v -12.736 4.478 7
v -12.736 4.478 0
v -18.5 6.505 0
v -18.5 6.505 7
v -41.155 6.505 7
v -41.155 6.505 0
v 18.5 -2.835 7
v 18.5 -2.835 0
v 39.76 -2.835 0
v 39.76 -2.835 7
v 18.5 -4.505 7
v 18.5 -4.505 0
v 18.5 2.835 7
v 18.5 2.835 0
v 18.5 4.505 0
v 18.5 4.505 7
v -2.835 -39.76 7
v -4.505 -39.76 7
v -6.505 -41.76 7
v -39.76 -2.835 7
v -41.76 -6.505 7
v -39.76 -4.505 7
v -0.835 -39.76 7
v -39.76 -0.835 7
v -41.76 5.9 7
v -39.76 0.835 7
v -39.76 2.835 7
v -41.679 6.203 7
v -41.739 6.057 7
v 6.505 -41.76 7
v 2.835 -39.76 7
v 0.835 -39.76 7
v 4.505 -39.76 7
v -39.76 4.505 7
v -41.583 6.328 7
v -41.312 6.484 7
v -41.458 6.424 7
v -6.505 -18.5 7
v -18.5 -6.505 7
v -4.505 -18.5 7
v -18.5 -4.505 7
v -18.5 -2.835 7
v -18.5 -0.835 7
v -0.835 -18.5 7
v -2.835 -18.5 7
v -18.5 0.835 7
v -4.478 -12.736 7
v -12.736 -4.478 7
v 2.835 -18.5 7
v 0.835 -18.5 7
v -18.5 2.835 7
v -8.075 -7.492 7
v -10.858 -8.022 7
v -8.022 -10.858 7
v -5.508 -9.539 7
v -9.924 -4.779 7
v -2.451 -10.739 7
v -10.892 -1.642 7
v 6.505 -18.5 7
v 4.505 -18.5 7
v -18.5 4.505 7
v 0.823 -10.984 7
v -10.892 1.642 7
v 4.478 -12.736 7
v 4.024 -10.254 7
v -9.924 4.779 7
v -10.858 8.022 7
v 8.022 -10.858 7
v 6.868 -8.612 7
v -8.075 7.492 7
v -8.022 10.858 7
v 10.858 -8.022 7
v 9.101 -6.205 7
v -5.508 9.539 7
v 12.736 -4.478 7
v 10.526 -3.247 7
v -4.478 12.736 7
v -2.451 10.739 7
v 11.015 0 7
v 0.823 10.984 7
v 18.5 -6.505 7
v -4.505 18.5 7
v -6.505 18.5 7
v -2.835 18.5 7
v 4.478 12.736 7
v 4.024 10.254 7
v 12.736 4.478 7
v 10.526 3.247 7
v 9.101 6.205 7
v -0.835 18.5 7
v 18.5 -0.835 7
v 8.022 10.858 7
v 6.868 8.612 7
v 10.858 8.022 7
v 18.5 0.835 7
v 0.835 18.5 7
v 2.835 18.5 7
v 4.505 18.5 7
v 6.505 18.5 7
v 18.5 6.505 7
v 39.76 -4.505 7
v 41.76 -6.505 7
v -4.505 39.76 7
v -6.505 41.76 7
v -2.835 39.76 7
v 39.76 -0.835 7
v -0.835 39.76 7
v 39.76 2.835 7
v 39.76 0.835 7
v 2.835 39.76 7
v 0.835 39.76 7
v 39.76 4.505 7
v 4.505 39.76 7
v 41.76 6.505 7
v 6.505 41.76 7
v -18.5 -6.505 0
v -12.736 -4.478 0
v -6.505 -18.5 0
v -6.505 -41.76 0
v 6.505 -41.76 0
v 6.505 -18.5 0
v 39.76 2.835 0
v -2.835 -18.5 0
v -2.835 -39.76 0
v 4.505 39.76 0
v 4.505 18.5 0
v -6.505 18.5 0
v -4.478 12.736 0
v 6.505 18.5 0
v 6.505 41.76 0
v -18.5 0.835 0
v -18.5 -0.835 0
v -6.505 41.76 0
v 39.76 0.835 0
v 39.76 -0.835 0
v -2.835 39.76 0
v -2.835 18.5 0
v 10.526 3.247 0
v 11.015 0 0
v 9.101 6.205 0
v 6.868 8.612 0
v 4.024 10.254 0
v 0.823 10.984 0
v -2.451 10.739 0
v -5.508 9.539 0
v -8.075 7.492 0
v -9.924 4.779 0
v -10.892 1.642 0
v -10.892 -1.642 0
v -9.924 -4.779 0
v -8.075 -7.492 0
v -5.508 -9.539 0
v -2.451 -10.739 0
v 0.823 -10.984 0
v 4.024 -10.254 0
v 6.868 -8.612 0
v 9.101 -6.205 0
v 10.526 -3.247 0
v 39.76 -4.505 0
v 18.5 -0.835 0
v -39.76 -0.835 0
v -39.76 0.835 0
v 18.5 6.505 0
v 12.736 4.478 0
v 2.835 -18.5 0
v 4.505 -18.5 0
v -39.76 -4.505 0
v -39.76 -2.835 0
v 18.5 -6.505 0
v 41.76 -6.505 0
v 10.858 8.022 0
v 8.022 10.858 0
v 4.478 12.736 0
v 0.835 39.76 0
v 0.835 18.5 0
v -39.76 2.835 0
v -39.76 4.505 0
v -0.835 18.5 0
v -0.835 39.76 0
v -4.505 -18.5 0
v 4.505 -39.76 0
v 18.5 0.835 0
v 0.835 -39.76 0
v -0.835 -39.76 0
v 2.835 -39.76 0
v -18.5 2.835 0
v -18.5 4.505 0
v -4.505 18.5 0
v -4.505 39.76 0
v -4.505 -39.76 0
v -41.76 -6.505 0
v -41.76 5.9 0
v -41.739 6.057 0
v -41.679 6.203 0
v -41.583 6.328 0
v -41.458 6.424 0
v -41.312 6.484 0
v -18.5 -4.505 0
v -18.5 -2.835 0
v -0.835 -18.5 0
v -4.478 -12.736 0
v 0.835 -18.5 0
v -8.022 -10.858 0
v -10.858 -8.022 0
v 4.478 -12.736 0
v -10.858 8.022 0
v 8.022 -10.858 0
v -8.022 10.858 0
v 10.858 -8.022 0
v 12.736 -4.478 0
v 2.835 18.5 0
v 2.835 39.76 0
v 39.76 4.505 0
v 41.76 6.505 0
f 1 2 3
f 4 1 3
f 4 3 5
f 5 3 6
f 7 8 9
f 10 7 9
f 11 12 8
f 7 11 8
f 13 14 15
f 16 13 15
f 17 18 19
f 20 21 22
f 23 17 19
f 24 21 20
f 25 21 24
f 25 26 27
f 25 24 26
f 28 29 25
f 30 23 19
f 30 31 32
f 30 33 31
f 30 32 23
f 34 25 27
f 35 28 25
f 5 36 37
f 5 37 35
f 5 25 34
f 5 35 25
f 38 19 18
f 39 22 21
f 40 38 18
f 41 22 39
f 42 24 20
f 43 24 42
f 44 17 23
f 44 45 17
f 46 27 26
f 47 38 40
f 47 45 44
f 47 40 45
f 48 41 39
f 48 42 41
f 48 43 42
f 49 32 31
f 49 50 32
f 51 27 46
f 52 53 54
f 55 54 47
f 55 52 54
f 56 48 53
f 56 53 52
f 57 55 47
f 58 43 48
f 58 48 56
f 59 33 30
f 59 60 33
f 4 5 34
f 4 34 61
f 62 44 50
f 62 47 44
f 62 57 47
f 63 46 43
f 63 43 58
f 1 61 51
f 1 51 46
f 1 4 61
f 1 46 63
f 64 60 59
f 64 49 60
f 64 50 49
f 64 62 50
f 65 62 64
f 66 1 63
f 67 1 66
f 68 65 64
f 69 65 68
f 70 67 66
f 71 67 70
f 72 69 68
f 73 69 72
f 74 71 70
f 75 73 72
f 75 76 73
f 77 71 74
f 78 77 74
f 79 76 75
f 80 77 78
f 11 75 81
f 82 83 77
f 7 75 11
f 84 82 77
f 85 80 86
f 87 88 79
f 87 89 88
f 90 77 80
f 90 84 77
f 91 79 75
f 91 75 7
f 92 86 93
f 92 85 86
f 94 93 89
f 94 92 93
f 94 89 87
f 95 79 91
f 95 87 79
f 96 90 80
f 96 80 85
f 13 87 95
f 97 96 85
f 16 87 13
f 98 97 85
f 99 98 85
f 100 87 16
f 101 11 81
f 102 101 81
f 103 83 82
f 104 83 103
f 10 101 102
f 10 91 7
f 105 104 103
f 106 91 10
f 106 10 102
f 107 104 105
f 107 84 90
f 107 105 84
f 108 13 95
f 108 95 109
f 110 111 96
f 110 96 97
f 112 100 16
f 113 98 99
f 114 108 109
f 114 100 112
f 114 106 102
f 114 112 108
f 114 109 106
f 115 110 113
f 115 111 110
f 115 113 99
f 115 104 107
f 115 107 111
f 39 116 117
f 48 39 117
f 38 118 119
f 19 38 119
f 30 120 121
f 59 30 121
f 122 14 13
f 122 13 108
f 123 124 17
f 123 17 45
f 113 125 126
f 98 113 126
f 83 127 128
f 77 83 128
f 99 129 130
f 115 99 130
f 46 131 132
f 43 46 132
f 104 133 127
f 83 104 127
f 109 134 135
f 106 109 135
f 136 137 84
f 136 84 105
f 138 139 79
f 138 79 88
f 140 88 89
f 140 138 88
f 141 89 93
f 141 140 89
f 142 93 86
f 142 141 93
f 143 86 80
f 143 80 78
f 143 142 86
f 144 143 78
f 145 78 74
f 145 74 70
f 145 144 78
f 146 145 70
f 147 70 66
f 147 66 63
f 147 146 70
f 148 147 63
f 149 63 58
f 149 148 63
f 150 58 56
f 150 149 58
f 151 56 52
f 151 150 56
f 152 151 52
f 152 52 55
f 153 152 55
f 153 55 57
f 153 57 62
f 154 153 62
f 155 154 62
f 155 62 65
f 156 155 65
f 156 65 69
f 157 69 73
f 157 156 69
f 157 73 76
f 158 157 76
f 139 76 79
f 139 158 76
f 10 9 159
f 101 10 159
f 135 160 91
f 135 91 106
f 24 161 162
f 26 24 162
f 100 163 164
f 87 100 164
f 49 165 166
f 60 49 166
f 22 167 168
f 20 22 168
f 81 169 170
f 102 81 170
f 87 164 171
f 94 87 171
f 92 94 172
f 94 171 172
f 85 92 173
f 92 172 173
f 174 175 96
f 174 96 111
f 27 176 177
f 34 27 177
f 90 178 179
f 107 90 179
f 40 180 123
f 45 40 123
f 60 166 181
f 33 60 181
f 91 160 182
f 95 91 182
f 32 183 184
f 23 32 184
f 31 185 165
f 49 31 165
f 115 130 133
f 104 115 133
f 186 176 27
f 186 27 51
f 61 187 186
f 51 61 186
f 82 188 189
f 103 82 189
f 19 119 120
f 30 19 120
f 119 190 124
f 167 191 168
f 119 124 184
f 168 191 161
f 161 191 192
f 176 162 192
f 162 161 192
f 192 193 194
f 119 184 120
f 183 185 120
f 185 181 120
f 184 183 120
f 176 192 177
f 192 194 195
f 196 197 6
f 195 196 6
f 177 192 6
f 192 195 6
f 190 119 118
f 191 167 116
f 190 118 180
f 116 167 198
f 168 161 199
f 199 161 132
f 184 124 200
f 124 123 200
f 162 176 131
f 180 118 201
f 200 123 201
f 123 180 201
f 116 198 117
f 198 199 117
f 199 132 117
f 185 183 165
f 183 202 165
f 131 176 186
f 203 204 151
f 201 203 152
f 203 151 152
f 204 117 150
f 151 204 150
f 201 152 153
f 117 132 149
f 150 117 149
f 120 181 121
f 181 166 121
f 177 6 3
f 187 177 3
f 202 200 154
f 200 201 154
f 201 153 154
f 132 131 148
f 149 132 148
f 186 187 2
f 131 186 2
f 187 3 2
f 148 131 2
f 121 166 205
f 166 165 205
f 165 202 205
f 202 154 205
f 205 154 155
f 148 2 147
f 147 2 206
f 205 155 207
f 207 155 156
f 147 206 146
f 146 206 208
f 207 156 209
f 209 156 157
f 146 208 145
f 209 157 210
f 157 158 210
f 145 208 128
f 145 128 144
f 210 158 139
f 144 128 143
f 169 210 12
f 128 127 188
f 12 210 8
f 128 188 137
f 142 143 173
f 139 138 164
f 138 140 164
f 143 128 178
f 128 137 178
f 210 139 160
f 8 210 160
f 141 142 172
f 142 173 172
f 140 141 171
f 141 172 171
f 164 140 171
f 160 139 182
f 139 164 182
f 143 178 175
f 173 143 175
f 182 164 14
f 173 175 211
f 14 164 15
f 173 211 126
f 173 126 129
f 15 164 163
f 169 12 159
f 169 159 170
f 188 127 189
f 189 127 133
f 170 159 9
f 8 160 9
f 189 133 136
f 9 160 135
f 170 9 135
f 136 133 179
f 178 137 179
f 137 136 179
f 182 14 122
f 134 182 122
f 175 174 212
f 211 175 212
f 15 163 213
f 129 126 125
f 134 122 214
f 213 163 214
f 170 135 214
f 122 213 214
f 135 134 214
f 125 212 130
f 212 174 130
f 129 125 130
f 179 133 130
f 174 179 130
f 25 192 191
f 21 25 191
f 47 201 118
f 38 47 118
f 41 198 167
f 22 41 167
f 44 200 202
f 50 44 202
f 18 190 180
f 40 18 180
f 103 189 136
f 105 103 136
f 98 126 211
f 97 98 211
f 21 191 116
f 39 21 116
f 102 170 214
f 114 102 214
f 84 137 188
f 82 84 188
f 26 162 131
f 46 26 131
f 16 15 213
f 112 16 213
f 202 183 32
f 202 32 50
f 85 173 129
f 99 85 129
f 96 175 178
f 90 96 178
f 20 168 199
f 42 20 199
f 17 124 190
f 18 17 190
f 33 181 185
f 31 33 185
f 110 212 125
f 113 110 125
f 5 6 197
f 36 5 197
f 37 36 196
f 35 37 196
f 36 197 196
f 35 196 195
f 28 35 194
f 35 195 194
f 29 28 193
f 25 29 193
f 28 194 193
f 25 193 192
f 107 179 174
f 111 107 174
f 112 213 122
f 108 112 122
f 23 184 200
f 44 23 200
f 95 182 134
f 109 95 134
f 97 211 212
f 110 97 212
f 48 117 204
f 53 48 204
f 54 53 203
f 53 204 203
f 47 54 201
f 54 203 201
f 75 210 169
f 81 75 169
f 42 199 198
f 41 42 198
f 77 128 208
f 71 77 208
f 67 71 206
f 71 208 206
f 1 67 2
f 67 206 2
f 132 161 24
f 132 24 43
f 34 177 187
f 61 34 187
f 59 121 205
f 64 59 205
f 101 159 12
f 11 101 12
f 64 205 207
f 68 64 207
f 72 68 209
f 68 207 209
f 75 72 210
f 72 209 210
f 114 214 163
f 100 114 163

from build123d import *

# Parameters (mm, degrees)
F0_R     = 11.015
F1_DEPTH = 7
F2_DEPTH = 7
F3_DEPTH = 7
F0_W     = 2
F0_H     = 21.26
F0_W_2   = 21.26
F0_H_2   = 2
F4_DEPTH = 7


with BuildPart() as f1:
    # F0 (on Top) → F1 (new body)
    with BuildSketch(Plane.XY):
        with BuildLine():
            ThreePointArc((12.735635, 4.478125), (13.307537, 2.271445), (13.5, 0))
            Line((13.5, 0), (18.5, 0))
            Line((18.5, 0), (18.5, 0.835))
            Line((18.5, 0.835), (18.5, 2.835))
            Line((18.5, 2.835), (18.5, 4.505))
            Line((18.5, 4.505), (39.76, 4.505))
            Line((39.76, 4.505), (39.76, 6.505))
            Line((39.76, 6.505), (18.5, 6.505))
            Line((18.5, 6.505), (12.735635, 4.478125))
        make_face()
        with BuildLine():
            ThreePointArc((0, 13.5), (2.271445, 13.307537), (4.478125, 12.735635))
            Line((4.478125, 12.735635), (6.505, 18.5))
            Line((6.505, 18.5), (6.505, 39.76))
            Line((6.505, 39.76), (4.505, 39.76))
            Line((4.505, 39.76), (4.505, 18.5))
            Line((4.505, 18.5), (2.835, 18.5))
            Line((2.835, 18.5), (0.835, 18.5))
            Line((0.835, 18.5), (0, 18.5))
            Line((0, 18.5), (0, 13.5))
        make_face()
        with BuildLine():
            ThreePointArc((-4.478125, 12.735635), (-2.271445, 13.307537), (0, 13.5))
            Line((0, 13.5), (0, 18.5))
            Line((0, 18.5), (-0.835, 18.5))
            Line((-0.835, 18.5), (-2.835, 18.5))
            Line((-2.835, 18.5), (-4.505, 18.5))
            Line((-4.505, 18.5), (-4.505, 39.76))
            Line((-4.505, 39.76), (-6.505, 39.76))
            Line((-6.505, 39.76), (-6.505, 18.5))
            Line((-6.505, 18.5), (-4.478125, 12.735635))
        make_face()
        with BuildLine():
            ThreePointArc((-13.5, 0), (-13.307537, 2.271445), (-12.735635, 4.478125))
            Line((-12.735635, 4.478125), (-18.5, 6.505))
            Line((-18.5, 6.505), (-39.76, 6.505))
            Line((-39.76, 6.505), (-39.76, 4.505))
            Line((-39.76, 4.505), (-18.5, 4.505))
            Line((-18.5, 4.505), (-18.5, 2.835))
            Line((-18.5, 2.835), (-18.5, 0.835))
            Line((-18.5, 0.835), (-18.5, 0))
            Line((-18.5, 0), (-13.5, 0))
        make_face()
        with BuildLine():
            Line((-18.5, -6.505), (-12.735635, -4.478125))
            ThreePointArc((-12.735635, -4.478125), (-13.307537, -2.271445), (-13.5, 0))
            Line((-13.5, 0), (-18.5, 0))
            Line((-18.5, 0), (-18.5, -0.835))
            Line((-18.5, -0.835), (-18.5, -2.835))
            Line((-18.5, -2.835), (-18.5, -4.505))
            Line((-18.5, -4.505), (-39.76, -4.505))
            Line((-39.76, -4.505), (-39.76, -6.505))
            Line((-39.76, -6.505), (-18.5, -6.505))
        make_face()
        with BuildLine():
            Line((0, -18.5), (0, -13.5))
            ThreePointArc((0, -13.5), (-2.271445, -13.307537), (-4.478125, -12.735635))
            Line((-4.478125, -12.735635), (-6.505, -18.5))
            Line((-6.505, -18.5), (-6.505, -39.76))
            Line((-6.505, -39.76), (-4.505, -39.76))
            Line((-4.505, -39.76), (-4.505, -18.5))
            Line((-4.505, -18.5), (-2.835, -18.5))
            Line((-2.835, -18.5), (-0.835, -18.5))
            Line((-0.835, -18.5), (0, -18.5))
        make_face()
        with BuildLine():
            Line((6.505, -18.5), (4.478125, -12.735635))
            ThreePointArc((4.478125, -12.735635), (2.271445, -13.307537), (0, -13.5))
            Line((0, -13.5), (0, -18.5))
            Line((0, -18.5), (0.835, -18.5))
            Line((0.835, -18.5), (2.835, -18.5))
            Line((2.835, -18.5), (4.505, -18.5))
            Line((4.505, -18.5), (4.505, -39.76))
            Line((4.505, -39.76), (6.505, -39.76))
            Line((6.505, -39.76), (6.505, -18.5))
        make_face()
        with BuildLine():
            Line((18.5, 0), (13.5, 0))
            ThreePointArc((13.5, 0), (13.307537, -2.271445), (12.735635, -4.478125))
            Line((12.735635, -4.478125), (18.5, -6.505))
            Line((18.5, -6.505), (39.76, -6.505))
            Line((39.76, -6.505), (39.76, -4.505))
            Line((39.76, -4.505), (18.5, -4.505))
            Line((18.5, -4.505), (18.5, -2.835))
            Line((18.5, -2.835), (18.5, -0.835))
            Line((18.5, -0.835), (18.5, 0))
        make_face()
        Polygon((4.505, 39.76), (6.505, 39.76), (6.505, 41.76), (-6.505, 41.76), (-6.505, 39.76), (-4.505, 39.76), (-2.835, 39.76), (-0.835, 39.76), (0, 39.76), (0.835, 39.76), (2.835, 39.76), align=None)
        with BuildLine():
            Line((-39.76, 4.505), (-39.76, 6.505))
            Line((-39.76, 6.505), (-41.155497, 6.505))
            ThreePointArc((-41.155497, 6.505), (-41.582945, 6.327945), (-41.76, 5.900497))
            Line((-41.76, 5.900497), (-41.76, -6.505))
            Line((-41.76, -6.505), (-39.76, -6.505))
            Line((-39.76, -6.505), (-39.76, -4.505))
            Line((-39.76, -4.505), (-39.76, -2.835))
            Line((-39.76, -2.835), (-39.76, -0.835))
            Line((-39.76, -0.835), (-39.76, 0))
            Line((-39.76, 0), (-39.76, 0.835))
            Line((-39.76, 0.835), (-39.76, 2.835))
            Line((-39.76, 2.835), (-39.76, 4.505))
        make_face()
        Polygon((6.505, -41.76), (6.505, -39.76), (4.505, -39.76), (2.835, -39.76), (0.835, -39.76), (0, -39.76), (-0.835, -39.76), (-2.835, -39.76), (-4.505, -39.76), (-6.505, -39.76), (-6.505, -41.76), align=None)
        Polygon((41.76, 6.505), (39.76, 6.505), (39.76, 4.505), (39.76, 2.835), (39.76, 0.835), (39.76, 0), (39.76, -0.835), (39.76, -2.835), (39.76, -4.505), (39.76, -6.505), (41.76, -6.505), align=None)
        with BuildLine():
            ThreePointArc((12.735635, -4.478125), (13.307537, -2.271445), (13.5, 0))
            ThreePointArc((13.5, 0), (13.307537, 2.271445), (12.735635, 4.478125))
            ThreePointArc((12.735635, 4.478125), (9.545942, 9.545942), (4.478125, 12.735635))
            ThreePointArc((4.478125, 12.735635), (2.271445, 13.307537), (0, 13.5))
            ThreePointArc((0, 13.5), (-2.271445, 13.307537), (-4.478125, 12.735635))
            ThreePointArc((-4.478125, 12.735635), (-9.545942, 9.545942), (-12.735635, 4.478125))
            ThreePointArc((-12.735635, 4.478125), (-13.307537, 2.271445), (-13.5, 0))
            ThreePointArc((-13.5, 0), (-13.307537, -2.271445), (-12.735635, -4.478125))
            ThreePointArc((-12.735635, -4.478125), (-9.545942, -9.545942), (-4.478125, -12.735635))
            ThreePointArc((-4.478125, -12.735635), (-2.271445, -13.307537), (0, -13.5))
            ThreePointArc((0, -13.5), (2.271445, -13.307537), (4.478125, -12.735635))
            ThreePointArc((4.478125, -12.735635), (9.545942, -9.545942), (12.735635, -4.478125))
        make_face()
        Circle(F0_R, mode=Mode.SUBTRACT)
    extrude(amount=F1_DEPTH)

    # F0 (on Top) → F2 (join)
    with BuildSketch(Plane.XY):
        with BuildLine():
            ThreePointArc((12.735635, 4.478125), (13.307537, 2.271445), (13.5, 0))
            Line((13.5, 0), (18.5, 0))
            Line((18.5, 0), (18.5, 0.835))
            Line((18.5, 0.835), (18.5, 2.835))
            Line((18.5, 2.835), (18.5, 4.505))
            Line((18.5, 4.505), (39.76, 4.505))
            Line((39.76, 4.505), (39.76, 6.505))
            Line((39.76, 6.505), (18.5, 6.505))
            Line((18.5, 6.505), (12.735635, 4.478125))
        make_face()
        with BuildLine():
            ThreePointArc((0, 13.5), (2.271445, 13.307537), (4.478125, 12.735635))
            Line((4.478125, 12.735635), (6.505, 18.5))
            Line((6.505, 18.5), (6.505, 39.76))
            Line((6.505, 39.76), (4.505, 39.76))
            Line((4.505, 39.76), (4.505, 18.5))
            Line((4.505, 18.5), (2.835, 18.5))
            Line((2.835, 18.5), (0.835, 18.5))
            Line((0.835, 18.5), (0, 18.5))
            Line((0, 18.5), (0, 13.5))
        make_face()
        with BuildLine():
            ThreePointArc((-4.478125, 12.735635), (-2.271445, 13.307537), (0, 13.5))
            Line((0, 13.5), (0, 18.5))
            Line((0, 18.5), (-0.835, 18.5))
            Line((-0.835, 18.5), (-2.835, 18.5))
            Line((-2.835, 18.5), (-4.505, 18.5))
            Line((-4.505, 18.5), (-4.505, 39.76))
            Line((-4.505, 39.76), (-6.505, 39.76))
            Line((-6.505, 39.76), (-6.505, 18.5))
            Line((-6.505, 18.5), (-4.478125, 12.735635))
        make_face()
        with BuildLine():
            ThreePointArc((-13.5, 0), (-13.307537, 2.271445), (-12.735635, 4.478125))
            Line((-12.735635, 4.478125), (-18.5, 6.505))
            Line((-18.5, 6.505), (-39.76, 6.505))
            Line((-39.76, 6.505), (-39.76, 4.505))
            Line((-39.76, 4.505), (-18.5, 4.505))
            Line((-18.5, 4.505), (-18.5, 2.835))
            Line((-18.5, 2.835), (-18.5, 0.835))
            Line((-18.5, 0.835), (-18.5, 0))
            Line((-18.5, 0), (-13.5, 0))
        make_face()
        with BuildLine():
            Line((-18.5, -6.505), (-12.735635, -4.478125))
            ThreePointArc((-12.735635, -4.478125), (-13.307537, -2.271445), (-13.5, 0))
            Line((-13.5, 0), (-18.5, 0))
            Line((-18.5, 0), (-18.5, -0.835))
            Line((-18.5, -0.835), (-18.5, -2.835))
            Line((-18.5, -2.835), (-18.5, -4.505))
            Line((-18.5, -4.505), (-39.76, -4.505))
            Line((-39.76, -4.505), (-39.76, -6.505))
            Line((-39.76, -6.505), (-18.5, -6.505))
        make_face()
        with BuildLine():
            Line((0, -18.5), (0, -13.5))
            ThreePointArc((0, -13.5), (-2.271445, -13.307537), (-4.478125, -12.735635))
            Line((-4.478125, -12.735635), (-6.505, -18.5))
            Line((-6.505, -18.5), (-6.505, -39.76))
            Line((-6.505, -39.76), (-4.505, -39.76))
            Line((-4.505, -39.76), (-4.505, -18.5))
            Line((-4.505, -18.5), (-2.835, -18.5))
            Line((-2.835, -18.5), (-0.835, -18.5))
            Line((-0.835, -18.5), (0, -18.5))
        make_face()
        with BuildLine():
            Line((6.505, -18.5), (4.478125, -12.735635))
            ThreePointArc((4.478125, -12.735635), (2.271445, -13.307537), (0, -13.5))
            Line((0, -13.5), (0, -18.5))
            Line((0, -18.5), (0.835, -18.5))
            Line((0.835, -18.5), (2.835, -18.5))
            Line((2.835, -18.5), (4.505, -18.5))
            Line((4.505, -18.5), (4.505, -39.76))
            Line((4.505, -39.76), (6.505, -39.76))
            Line((6.505, -39.76), (6.505, -18.5))
        make_face()
        with BuildLine():
            Line((18.5, 0), (13.5, 0))
            ThreePointArc((13.5, 0), (13.307537, -2.271445), (12.735635, -4.478125))
            Line((12.735635, -4.478125), (18.5, -6.505))
            Line((18.5, -6.505), (39.76, -6.505))
            Line((39.76, -6.505), (39.76, -4.505))
            Line((39.76, -4.505), (18.5, -4.505))
            Line((18.5, -4.505), (18.5, -2.835))
            Line((18.5, -2.835), (18.5, -0.835))
            Line((18.5, -0.835), (18.5, 0))
        make_face()
        Polygon((4.505, 39.76), (6.505, 39.76), (6.505, 41.76), (-6.505, 41.76), (-6.505, 39.76), (-4.505, 39.76), (-2.835, 39.76), (-0.835, 39.76), (0, 39.76), (0.835, 39.76), (2.835, 39.76), align=None)
        with BuildLine():
            Line((-39.76, 4.505), (-39.76, 6.505))
            Line((-39.76, 6.505), (-41.155497, 6.505))
            ThreePointArc((-41.155497, 6.505), (-41.582945, 6.327945), (-41.76, 5.900497))
            Line((-41.76, 5.900497), (-41.76, -6.505))
            Line((-41.76, -6.505), (-39.76, -6.505))
            Line((-39.76, -6.505), (-39.76, -4.505))
            Line((-39.76, -4.505), (-39.76, -2.835))
            Line((-39.76, -2.835), (-39.76, -0.835))
            Line((-39.76, -0.835), (-39.76, 0))
            Line((-39.76, 0), (-39.76, 0.835))
            Line((-39.76, 0.835), (-39.76, 2.835))
            Line((-39.76, 2.835), (-39.76, 4.505))
        make_face()
        Polygon((6.505, -41.76), (6.505, -39.76), (4.505, -39.76), (2.835, -39.76), (0.835, -39.76), (0, -39.76), (-0.835, -39.76), (-2.835, -39.76), (-4.505, -39.76), (-6.505, -39.76), (-6.505, -41.76), align=None)
        Polygon((41.76, 6.505), (39.76, 6.505), (39.76, 4.505), (39.76, 2.835), (39.76, 0.835), (39.76, 0), (39.76, -0.835), (39.76, -2.835), (39.76, -4.505), (39.76, -6.505), (41.76, -6.505), align=None)
        with BuildLine():
            ThreePointArc((12.735635, -4.478125), (13.307537, -2.271445), (13.5, 0))
            ThreePointArc((13.5, 0), (13.307537, 2.271445), (12.735635, 4.478125))
            ThreePointArc((12.735635, 4.478125), (9.545942, 9.545942), (4.478125, 12.735635))
            ThreePointArc((4.478125, 12.735635), (2.271445, 13.307537), (0, 13.5))
            ThreePointArc((0, 13.5), (-2.271445, 13.307537), (-4.478125, 12.735635))
            ThreePointArc((-4.478125, 12.735635), (-9.545942, 9.545942), (-12.735635, 4.478125))
            ThreePointArc((-12.735635, 4.478125), (-13.307537, 2.271445), (-13.5, 0))
            ThreePointArc((-13.5, 0), (-13.307537, -2.271445), (-12.735635, -4.478125))
            ThreePointArc((-12.735635, -4.478125), (-9.545942, -9.545942), (-4.478125, -12.735635))
            ThreePointArc((-4.478125, -12.735635), (-2.271445, -13.307537), (0, -13.5))
            ThreePointArc((0, -13.5), (2.271445, -13.307537), (4.478125, -12.735635))
            ThreePointArc((4.478125, -12.735635), (9.545942, -9.545942), (12.735635, -4.478125))
        make_face()
        Circle(F0_R, mode=Mode.SUBTRACT)
    extrude(amount=F2_DEPTH)

    # F0 (on Top) → F3 (join)
    with BuildSketch(Plane.XY):
        with BuildLine():
            ThreePointArc((12.735635, 4.478125), (13.307537, 2.271445), (13.5, 0))
            Line((13.5, 0), (18.5, 0))
            Line((18.5, 0), (18.5, 0.835))
            Line((18.5, 0.835), (18.5, 2.835))
            Line((18.5, 2.835), (18.5, 4.505))
            Line((18.5, 4.505), (39.76, 4.505))
            Line((39.76, 4.505), (39.76, 6.505))
            Line((39.76, 6.505), (18.5, 6.505))
            Line((18.5, 6.505), (12.735635, 4.478125))
        make_face()
        with BuildLine():
            ThreePointArc((0, 13.5), (2.271445, 13.307537), (4.478125, 12.735635))
            Line((4.478125, 12.735635), (6.505, 18.5))
            Line((6.505, 18.5), (6.505, 39.76))
            Line((6.505, 39.76), (4.505, 39.76))
            Line((4.505, 39.76), (4.505, 18.5))
            Line((4.505, 18.5), (2.835, 18.5))
            Line((2.835, 18.5), (0.835, 18.5))
            Line((0.835, 18.5), (0, 18.5))
            Line((0, 18.5), (0, 13.5))
        make_face()
        with BuildLine():
            ThreePointArc((-4.478125, 12.735635), (-2.271445, 13.307537), (0, 13.5))
            Line((0, 13.5), (0, 18.5))
            Line((0, 18.5), (-0.835, 18.5))
            Line((-0.835, 18.5), (-2.835, 18.5))
            Line((-2.835, 18.5), (-4.505, 18.5))
            Line((-4.505, 18.5), (-4.505, 39.76))
            Line((-4.505, 39.76), (-6.505, 39.76))
            Line((-6.505, 39.76), (-6.505, 18.5))
            Line((-6.505, 18.5), (-4.478125, 12.735635))
        make_face()
        with BuildLine():
            ThreePointArc((-13.5, 0), (-13.307537, 2.271445), (-12.735635, 4.478125))
            Line((-12.735635, 4.478125), (-18.5, 6.505))
            Line((-18.5, 6.505), (-39.76, 6.505))
            Line((-39.76, 6.505), (-39.76, 4.505))
            Line((-39.76, 4.505), (-18.5, 4.505))
            Line((-18.5, 4.505), (-18.5, 2.835))
            Line((-18.5, 2.835), (-18.5, 0.835))
            Line((-18.5, 0.835), (-18.5, 0))
            Line((-18.5, 0), (-13.5, 0))
        make_face()
        with BuildLine():
            Line((-18.5, -6.505), (-12.735635, -4.478125))
            ThreePointArc((-12.735635, -4.478125), (-13.307537, -2.271445), (-13.5, 0))
            Line((-13.5, 0), (-18.5, 0))
            Line((-18.5, 0), (-18.5, -0.835))
            Line((-18.5, -0.835), (-18.5, -2.835))
            Line((-18.5, -2.835), (-18.5, -4.505))
            Line((-18.5, -4.505), (-39.76, -4.505))
            Line((-39.76, -4.505), (-39.76, -6.505))
            Line((-39.76, -6.505), (-18.5, -6.505))
        make_face()
        with BuildLine():
            Line((0, -18.5), (0, -13.5))
            ThreePointArc((0, -13.5), (-2.271445, -13.307537), (-4.478125, -12.735635))
            Line((-4.478125, -12.735635), (-6.505, -18.5))
            Line((-6.505, -18.5), (-6.505, -39.76))
            Line((-6.505, -39.76), (-4.505, -39.76))
            Line((-4.505, -39.76), (-4.505, -18.5))
            Line((-4.505, -18.5), (-2.835, -18.5))
            Line((-2.835, -18.5), (-0.835, -18.5))
            Line((-0.835, -18.5), (0, -18.5))
        make_face()
        with BuildLine():
            Line((6.505, -18.5), (4.478125, -12.735635))
            ThreePointArc((4.478125, -12.735635), (2.271445, -13.307537), (0, -13.5))
            Line((0, -13.5), (0, -18.5))
            Line((0, -18.5), (0.835, -18.5))
            Line((0.835, -18.5), (2.835, -18.5))
            Line((2.835, -18.5), (4.505, -18.5))
            Line((4.505, -18.5), (4.505, -39.76))
            Line((4.505, -39.76), (6.505, -39.76))
            Line((6.505, -39.76), (6.505, -18.5))
        make_face()
        with BuildLine():
            Line((18.5, 0), (13.5, 0))
            ThreePointArc((13.5, 0), (13.307537, -2.271445), (12.735635, -4.478125))
            Line((12.735635, -4.478125), (18.5, -6.505))
            Line((18.5, -6.505), (39.76, -6.505))
            Line((39.76, -6.505), (39.76, -4.505))
            Line((39.76, -4.505), (18.5, -4.505))
            Line((18.5, -4.505), (18.5, -2.835))
            Line((18.5, -2.835), (18.5, -0.835))
            Line((18.5, -0.835), (18.5, 0))
        make_face()
        Polygon((4.505, 39.76), (6.505, 39.76), (6.505, 41.76), (-6.505, 41.76), (-6.505, 39.76), (-4.505, 39.76), (-2.835, 39.76), (-0.835, 39.76), (0, 39.76), (0.835, 39.76), (2.835, 39.76), align=None)
        with BuildLine():
            Line((-39.76, 4.505), (-39.76, 6.505))
            Line((-39.76, 6.505), (-41.155497, 6.505))
            ThreePointArc((-41.155497, 6.505), (-41.582945, 6.327945), (-41.76, 5.900497))
            Line((-41.76, 5.900497), (-41.76, -6.505))
            Line((-41.76, -6.505), (-39.76, -6.505))
            Line((-39.76, -6.505), (-39.76, -4.505))
            Line((-39.76, -4.505), (-39.76, -2.835))
            Line((-39.76, -2.835), (-39.76, -0.835))
            Line((-39.76, -0.835), (-39.76, 0))
            Line((-39.76, 0), (-39.76, 0.835))
            Line((-39.76, 0.835), (-39.76, 2.835))
            Line((-39.76, 2.835), (-39.76, 4.505))
        make_face()
        Polygon((6.505, -41.76), (6.505, -39.76), (4.505, -39.76), (2.835, -39.76), (0.835, -39.76), (0, -39.76), (-0.835, -39.76), (-2.835, -39.76), (-4.505, -39.76), (-6.505, -39.76), (-6.505, -41.76), align=None)
        Polygon((41.76, 6.505), (39.76, 6.505), (39.76, 4.505), (39.76, 2.835), (39.76, 0.835), (39.76, 0), (39.76, -0.835), (39.76, -2.835), (39.76, -4.505), (39.76, -6.505), (41.76, -6.505), align=None)
        with BuildLine():
            ThreePointArc((12.735635, -4.478125), (13.307537, -2.271445), (13.5, 0))
            ThreePointArc((13.5, 0), (13.307537, 2.271445), (12.735635, 4.478125))
            ThreePointArc((12.735635, 4.478125), (9.545942, 9.545942), (4.478125, 12.735635))
            ThreePointArc((4.478125, 12.735635), (2.271445, 13.307537), (0, 13.5))
            ThreePointArc((0, 13.5), (-2.271445, 13.307537), (-4.478125, 12.735635))
            ThreePointArc((-4.478125, 12.735635), (-9.545942, 9.545942), (-12.735635, 4.478125))
            ThreePointArc((-12.735635, 4.478125), (-13.307537, 2.271445), (-13.5, 0))
            ThreePointArc((-13.5, 0), (-13.307537, -2.271445), (-12.735635, -4.478125))
            ThreePointArc((-12.735635, -4.478125), (-9.545942, -9.545942), (-4.478125, -12.735635))
            ThreePointArc((-4.478125, -12.735635), (-2.271445, -13.307537), (0, -13.5))
            ThreePointArc((0, -13.5), (2.271445, -13.307537), (4.478125, -12.735635))
            ThreePointArc((4.478125, -12.735635), (9.545942, -9.545942), (12.735635, -4.478125))
        make_face()
        Circle(F0_R, mode=Mode.SUBTRACT)
    extrude(amount=F3_DEPTH)

    # F0 (on Top) → F4 (join)
    with BuildSketch(Plane.XY):
        with BuildLine():
            ThreePointArc((12.735635, 4.478125), (13.307537, 2.271445), (13.5, 0))
            Line((13.5, 0), (18.5, 0))
            Line((18.5, 0), (18.5, 0.835))
            Line((18.5, 0.835), (18.5, 2.835))
            Line((18.5, 2.835), (18.5, 4.505))
            Line((18.5, 4.505), (39.76, 4.505))
            Line((39.76, 4.505), (39.76, 6.505))
            Line((39.76, 6.505), (18.5, 6.505))
            Line((18.5, 6.505), (12.735635, 4.478125))
        make_face()
        with BuildLine():
            ThreePointArc((0, 13.5), (2.271445, 13.307537), (4.478125, 12.735635))
            Line((4.478125, 12.735635), (6.505, 18.5))
            Line((6.505, 18.5), (6.505, 39.76))
            Line((6.505, 39.76), (4.505, 39.76))
            Line((4.505, 39.76), (4.505, 18.5))
            Line((4.505, 18.5), (2.835, 18.5))
            Line((2.835, 18.5), (0.835, 18.5))
            Line((0.835, 18.5), (0, 18.5))
            Line((0, 18.5), (0, 13.5))
        make_face()
        with BuildLine():
            ThreePointArc((-4.478125, 12.735635), (-2.271445, 13.307537), (0, 13.5))
            Line((0, 13.5), (0, 18.5))
            Line((0, 18.5), (-0.835, 18.5))
            Line((-0.835, 18.5), (-2.835, 18.5))
            Line((-2.835, 18.5), (-4.505, 18.5))
            Line((-4.505, 18.5), (-4.505, 39.76))
            Line((-4.505, 39.76), (-6.505, 39.76))
            Line((-6.505, 39.76), (-6.505, 18.5))
            Line((-6.505, 18.5), (-4.478125, 12.735635))
        make_face()
        with BuildLine():
            ThreePointArc((-13.5, 0), (-13.307537, 2.271445), (-12.735635, 4.478125))
            Line((-12.735635, 4.478125), (-18.5, 6.505))
            Line((-18.5, 6.505), (-39.76, 6.505))
            Line((-39.76, 6.505), (-39.76, 4.505))
            Line((-39.76, 4.505), (-18.5, 4.505))
            Line((-18.5, 4.505), (-18.5, 2.835))
            Line((-18.5, 2.835), (-18.5, 0.835))
            Line((-18.5, 0.835), (-18.5, 0))
            Line((-18.5, 0), (-13.5, 0))
        make_face()
        with BuildLine():
            Line((-18.5, -6.505), (-12.735635, -4.478125))
            ThreePointArc((-12.735635, -4.478125), (-13.307537, -2.271445), (-13.5, 0))
            Line((-13.5, 0), (-18.5, 0))
            Line((-18.5, 0), (-18.5, -0.835))
            Line((-18.5, -0.835), (-18.5, -2.835))
            Line((-18.5, -2.835), (-18.5, -4.505))
            Line((-18.5, -4.505), (-39.76, -4.505))
            Line((-39.76, -4.505), (-39.76, -6.505))
            Line((-39.76, -6.505), (-18.5, -6.505))
        make_face()
        with BuildLine():
            Line((0, -18.5), (0, -13.5))
            ThreePointArc((0, -13.5), (-2.271445, -13.307537), (-4.478125, -12.735635))
            Line((-4.478125, -12.735635), (-6.505, -18.5))
            Line((-6.505, -18.5), (-6.505, -39.76))
            Line((-6.505, -39.76), (-4.505, -39.76))
            Line((-4.505, -39.76), (-4.505, -18.5))
            Line((-4.505, -18.5), (-2.835, -18.5))
            Line((-2.835, -18.5), (-0.835, -18.5))
            Line((-0.835, -18.5), (0, -18.5))
        make_face()
        with BuildLine():
            Line((6.505, -18.5), (4.478125, -12.735635))
            ThreePointArc((4.478125, -12.735635), (2.271445, -13.307537), (0, -13.5))
            Line((0, -13.5), (0, -18.5))
            Line((0, -18.5), (0.835, -18.5))
            Line((0.835, -18.5), (2.835, -18.5))
            Line((2.835, -18.5), (4.505, -18.5))
            Line((4.505, -18.5), (4.505, -39.76))
            Line((4.505, -39.76), (6.505, -39.76))
            Line((6.505, -39.76), (6.505, -18.5))
        make_face()
        with BuildLine():
            Line((18.5, 0), (13.5, 0))
            ThreePointArc((13.5, 0), (13.307537, -2.271445), (12.735635, -4.478125))
            Line((12.735635, -4.478125), (18.5, -6.505))
            Line((18.5, -6.505), (39.76, -6.505))
            Line((39.76, -6.505), (39.76, -4.505))
            Line((39.76, -4.505), (18.5, -4.505))
            Line((18.5, -4.505), (18.5, -2.835))
            Line((18.5, -2.835), (18.5, -0.835))
            Line((18.5, -0.835), (18.5, 0))
        make_face()
        Polygon((4.505, 39.76), (6.505, 39.76), (6.505, 41.76), (-6.505, 41.76), (-6.505, 39.76), (-4.505, 39.76), (-2.835, 39.76), (-0.835, 39.76), (0, 39.76), (0.835, 39.76), (2.835, 39.76), align=None)
        with BuildLine():
            Line((-39.76, 4.505), (-39.76, 6.505))
            Line((-39.76, 6.505), (-41.155497, 6.505))
            ThreePointArc((-41.155497, 6.505), (-41.582945, 6.327945), (-41.76, 5.900497))
            Line((-41.76, 5.900497), (-41.76, -6.505))
            Line((-41.76, -6.505), (-39.76, -6.505))
            Line((-39.76, -6.505), (-39.76, -4.505))
            Line((-39.76, -4.505), (-39.76, -2.835))
            Line((-39.76, -2.835), (-39.76, -0.835))
            Line((-39.76, -0.835), (-39.76, 0))
            Line((-39.76, 0), (-39.76, 0.835))
            Line((-39.76, 0.835), (-39.76, 2.835))
            Line((-39.76, 2.835), (-39.76, 4.505))
        make_face()
        Polygon((6.505, -41.76), (6.505, -39.76), (4.505, -39.76), (2.835, -39.76), (0.835, -39.76), (0, -39.76), (-0.835, -39.76), (-2.835, -39.76), (-4.505, -39.76), (-6.505, -39.76), (-6.505, -41.76), align=None)
        Polygon((41.76, 6.505), (39.76, 6.505), (39.76, 4.505), (39.76, 2.835), (39.76, 0.835), (39.76, 0), (39.76, -0.835), (39.76, -2.835), (39.76, -4.505), (39.76, -6.505), (41.76, -6.505), align=None)
        with BuildLine():
            ThreePointArc((12.735635, -4.478125), (13.307537, -2.271445), (13.5, 0))
            ThreePointArc((13.5, 0), (13.307537, 2.271445), (12.735635, 4.478125))
            ThreePointArc((12.735635, 4.478125), (9.545942, 9.545942), (4.478125, 12.735635))
            ThreePointArc((4.478125, 12.735635), (2.271445, 13.307537), (0, 13.5))
            ThreePointArc((0, 13.5), (-2.271445, 13.307537), (-4.478125, 12.735635))
            ThreePointArc((-4.478125, 12.735635), (-9.545942, 9.545942), (-12.735635, 4.478125))
            ThreePointArc((-12.735635, 4.478125), (-13.307537, 2.271445), (-13.5, 0))
            ThreePointArc((-13.5, 0), (-13.307537, -2.271445), (-12.735635, -4.478125))
            ThreePointArc((-12.735635, -4.478125), (-9.545942, -9.545942), (-4.478125, -12.735635))
            ThreePointArc((-4.478125, -12.735635), (-2.271445, -13.307537), (0, -13.5))
            ThreePointArc((0, -13.5), (2.271445, -13.307537), (4.478125, -12.735635))
            ThreePointArc((4.478125, -12.735635), (9.545942, -9.545942), (12.735635, -4.478125))
        make_face()
        Circle(F0_R, mode=Mode.SUBTRACT)
        with Locations((-1.835, 29.13)):
            Rectangle(F0_W, F0_H)
        with Locations((1.835, 29.13)):
            Rectangle(F0_W, F0_H)
        with Locations((29.13, 1.835)):
            Rectangle(F0_W_2, F0_H_2)
        with Locations((29.13, -1.835)):
            Rectangle(F0_W_2, F0_H_2)
        with Locations((-29.13, 1.835)):
            Rectangle(F0_W_2, F0_H_2)
        with Locations((-29.13, -1.835)):
            Rectangle(F0_W_2, F0_H_2)
        with Locations((-1.835, -29.13)):
            Rectangle(F0_W, F0_H)
        with Locations((1.835, -29.13)):
            Rectangle(F0_W, F0_H)
    extrude(amount=F4_DEPTH)


solid = f1.part
